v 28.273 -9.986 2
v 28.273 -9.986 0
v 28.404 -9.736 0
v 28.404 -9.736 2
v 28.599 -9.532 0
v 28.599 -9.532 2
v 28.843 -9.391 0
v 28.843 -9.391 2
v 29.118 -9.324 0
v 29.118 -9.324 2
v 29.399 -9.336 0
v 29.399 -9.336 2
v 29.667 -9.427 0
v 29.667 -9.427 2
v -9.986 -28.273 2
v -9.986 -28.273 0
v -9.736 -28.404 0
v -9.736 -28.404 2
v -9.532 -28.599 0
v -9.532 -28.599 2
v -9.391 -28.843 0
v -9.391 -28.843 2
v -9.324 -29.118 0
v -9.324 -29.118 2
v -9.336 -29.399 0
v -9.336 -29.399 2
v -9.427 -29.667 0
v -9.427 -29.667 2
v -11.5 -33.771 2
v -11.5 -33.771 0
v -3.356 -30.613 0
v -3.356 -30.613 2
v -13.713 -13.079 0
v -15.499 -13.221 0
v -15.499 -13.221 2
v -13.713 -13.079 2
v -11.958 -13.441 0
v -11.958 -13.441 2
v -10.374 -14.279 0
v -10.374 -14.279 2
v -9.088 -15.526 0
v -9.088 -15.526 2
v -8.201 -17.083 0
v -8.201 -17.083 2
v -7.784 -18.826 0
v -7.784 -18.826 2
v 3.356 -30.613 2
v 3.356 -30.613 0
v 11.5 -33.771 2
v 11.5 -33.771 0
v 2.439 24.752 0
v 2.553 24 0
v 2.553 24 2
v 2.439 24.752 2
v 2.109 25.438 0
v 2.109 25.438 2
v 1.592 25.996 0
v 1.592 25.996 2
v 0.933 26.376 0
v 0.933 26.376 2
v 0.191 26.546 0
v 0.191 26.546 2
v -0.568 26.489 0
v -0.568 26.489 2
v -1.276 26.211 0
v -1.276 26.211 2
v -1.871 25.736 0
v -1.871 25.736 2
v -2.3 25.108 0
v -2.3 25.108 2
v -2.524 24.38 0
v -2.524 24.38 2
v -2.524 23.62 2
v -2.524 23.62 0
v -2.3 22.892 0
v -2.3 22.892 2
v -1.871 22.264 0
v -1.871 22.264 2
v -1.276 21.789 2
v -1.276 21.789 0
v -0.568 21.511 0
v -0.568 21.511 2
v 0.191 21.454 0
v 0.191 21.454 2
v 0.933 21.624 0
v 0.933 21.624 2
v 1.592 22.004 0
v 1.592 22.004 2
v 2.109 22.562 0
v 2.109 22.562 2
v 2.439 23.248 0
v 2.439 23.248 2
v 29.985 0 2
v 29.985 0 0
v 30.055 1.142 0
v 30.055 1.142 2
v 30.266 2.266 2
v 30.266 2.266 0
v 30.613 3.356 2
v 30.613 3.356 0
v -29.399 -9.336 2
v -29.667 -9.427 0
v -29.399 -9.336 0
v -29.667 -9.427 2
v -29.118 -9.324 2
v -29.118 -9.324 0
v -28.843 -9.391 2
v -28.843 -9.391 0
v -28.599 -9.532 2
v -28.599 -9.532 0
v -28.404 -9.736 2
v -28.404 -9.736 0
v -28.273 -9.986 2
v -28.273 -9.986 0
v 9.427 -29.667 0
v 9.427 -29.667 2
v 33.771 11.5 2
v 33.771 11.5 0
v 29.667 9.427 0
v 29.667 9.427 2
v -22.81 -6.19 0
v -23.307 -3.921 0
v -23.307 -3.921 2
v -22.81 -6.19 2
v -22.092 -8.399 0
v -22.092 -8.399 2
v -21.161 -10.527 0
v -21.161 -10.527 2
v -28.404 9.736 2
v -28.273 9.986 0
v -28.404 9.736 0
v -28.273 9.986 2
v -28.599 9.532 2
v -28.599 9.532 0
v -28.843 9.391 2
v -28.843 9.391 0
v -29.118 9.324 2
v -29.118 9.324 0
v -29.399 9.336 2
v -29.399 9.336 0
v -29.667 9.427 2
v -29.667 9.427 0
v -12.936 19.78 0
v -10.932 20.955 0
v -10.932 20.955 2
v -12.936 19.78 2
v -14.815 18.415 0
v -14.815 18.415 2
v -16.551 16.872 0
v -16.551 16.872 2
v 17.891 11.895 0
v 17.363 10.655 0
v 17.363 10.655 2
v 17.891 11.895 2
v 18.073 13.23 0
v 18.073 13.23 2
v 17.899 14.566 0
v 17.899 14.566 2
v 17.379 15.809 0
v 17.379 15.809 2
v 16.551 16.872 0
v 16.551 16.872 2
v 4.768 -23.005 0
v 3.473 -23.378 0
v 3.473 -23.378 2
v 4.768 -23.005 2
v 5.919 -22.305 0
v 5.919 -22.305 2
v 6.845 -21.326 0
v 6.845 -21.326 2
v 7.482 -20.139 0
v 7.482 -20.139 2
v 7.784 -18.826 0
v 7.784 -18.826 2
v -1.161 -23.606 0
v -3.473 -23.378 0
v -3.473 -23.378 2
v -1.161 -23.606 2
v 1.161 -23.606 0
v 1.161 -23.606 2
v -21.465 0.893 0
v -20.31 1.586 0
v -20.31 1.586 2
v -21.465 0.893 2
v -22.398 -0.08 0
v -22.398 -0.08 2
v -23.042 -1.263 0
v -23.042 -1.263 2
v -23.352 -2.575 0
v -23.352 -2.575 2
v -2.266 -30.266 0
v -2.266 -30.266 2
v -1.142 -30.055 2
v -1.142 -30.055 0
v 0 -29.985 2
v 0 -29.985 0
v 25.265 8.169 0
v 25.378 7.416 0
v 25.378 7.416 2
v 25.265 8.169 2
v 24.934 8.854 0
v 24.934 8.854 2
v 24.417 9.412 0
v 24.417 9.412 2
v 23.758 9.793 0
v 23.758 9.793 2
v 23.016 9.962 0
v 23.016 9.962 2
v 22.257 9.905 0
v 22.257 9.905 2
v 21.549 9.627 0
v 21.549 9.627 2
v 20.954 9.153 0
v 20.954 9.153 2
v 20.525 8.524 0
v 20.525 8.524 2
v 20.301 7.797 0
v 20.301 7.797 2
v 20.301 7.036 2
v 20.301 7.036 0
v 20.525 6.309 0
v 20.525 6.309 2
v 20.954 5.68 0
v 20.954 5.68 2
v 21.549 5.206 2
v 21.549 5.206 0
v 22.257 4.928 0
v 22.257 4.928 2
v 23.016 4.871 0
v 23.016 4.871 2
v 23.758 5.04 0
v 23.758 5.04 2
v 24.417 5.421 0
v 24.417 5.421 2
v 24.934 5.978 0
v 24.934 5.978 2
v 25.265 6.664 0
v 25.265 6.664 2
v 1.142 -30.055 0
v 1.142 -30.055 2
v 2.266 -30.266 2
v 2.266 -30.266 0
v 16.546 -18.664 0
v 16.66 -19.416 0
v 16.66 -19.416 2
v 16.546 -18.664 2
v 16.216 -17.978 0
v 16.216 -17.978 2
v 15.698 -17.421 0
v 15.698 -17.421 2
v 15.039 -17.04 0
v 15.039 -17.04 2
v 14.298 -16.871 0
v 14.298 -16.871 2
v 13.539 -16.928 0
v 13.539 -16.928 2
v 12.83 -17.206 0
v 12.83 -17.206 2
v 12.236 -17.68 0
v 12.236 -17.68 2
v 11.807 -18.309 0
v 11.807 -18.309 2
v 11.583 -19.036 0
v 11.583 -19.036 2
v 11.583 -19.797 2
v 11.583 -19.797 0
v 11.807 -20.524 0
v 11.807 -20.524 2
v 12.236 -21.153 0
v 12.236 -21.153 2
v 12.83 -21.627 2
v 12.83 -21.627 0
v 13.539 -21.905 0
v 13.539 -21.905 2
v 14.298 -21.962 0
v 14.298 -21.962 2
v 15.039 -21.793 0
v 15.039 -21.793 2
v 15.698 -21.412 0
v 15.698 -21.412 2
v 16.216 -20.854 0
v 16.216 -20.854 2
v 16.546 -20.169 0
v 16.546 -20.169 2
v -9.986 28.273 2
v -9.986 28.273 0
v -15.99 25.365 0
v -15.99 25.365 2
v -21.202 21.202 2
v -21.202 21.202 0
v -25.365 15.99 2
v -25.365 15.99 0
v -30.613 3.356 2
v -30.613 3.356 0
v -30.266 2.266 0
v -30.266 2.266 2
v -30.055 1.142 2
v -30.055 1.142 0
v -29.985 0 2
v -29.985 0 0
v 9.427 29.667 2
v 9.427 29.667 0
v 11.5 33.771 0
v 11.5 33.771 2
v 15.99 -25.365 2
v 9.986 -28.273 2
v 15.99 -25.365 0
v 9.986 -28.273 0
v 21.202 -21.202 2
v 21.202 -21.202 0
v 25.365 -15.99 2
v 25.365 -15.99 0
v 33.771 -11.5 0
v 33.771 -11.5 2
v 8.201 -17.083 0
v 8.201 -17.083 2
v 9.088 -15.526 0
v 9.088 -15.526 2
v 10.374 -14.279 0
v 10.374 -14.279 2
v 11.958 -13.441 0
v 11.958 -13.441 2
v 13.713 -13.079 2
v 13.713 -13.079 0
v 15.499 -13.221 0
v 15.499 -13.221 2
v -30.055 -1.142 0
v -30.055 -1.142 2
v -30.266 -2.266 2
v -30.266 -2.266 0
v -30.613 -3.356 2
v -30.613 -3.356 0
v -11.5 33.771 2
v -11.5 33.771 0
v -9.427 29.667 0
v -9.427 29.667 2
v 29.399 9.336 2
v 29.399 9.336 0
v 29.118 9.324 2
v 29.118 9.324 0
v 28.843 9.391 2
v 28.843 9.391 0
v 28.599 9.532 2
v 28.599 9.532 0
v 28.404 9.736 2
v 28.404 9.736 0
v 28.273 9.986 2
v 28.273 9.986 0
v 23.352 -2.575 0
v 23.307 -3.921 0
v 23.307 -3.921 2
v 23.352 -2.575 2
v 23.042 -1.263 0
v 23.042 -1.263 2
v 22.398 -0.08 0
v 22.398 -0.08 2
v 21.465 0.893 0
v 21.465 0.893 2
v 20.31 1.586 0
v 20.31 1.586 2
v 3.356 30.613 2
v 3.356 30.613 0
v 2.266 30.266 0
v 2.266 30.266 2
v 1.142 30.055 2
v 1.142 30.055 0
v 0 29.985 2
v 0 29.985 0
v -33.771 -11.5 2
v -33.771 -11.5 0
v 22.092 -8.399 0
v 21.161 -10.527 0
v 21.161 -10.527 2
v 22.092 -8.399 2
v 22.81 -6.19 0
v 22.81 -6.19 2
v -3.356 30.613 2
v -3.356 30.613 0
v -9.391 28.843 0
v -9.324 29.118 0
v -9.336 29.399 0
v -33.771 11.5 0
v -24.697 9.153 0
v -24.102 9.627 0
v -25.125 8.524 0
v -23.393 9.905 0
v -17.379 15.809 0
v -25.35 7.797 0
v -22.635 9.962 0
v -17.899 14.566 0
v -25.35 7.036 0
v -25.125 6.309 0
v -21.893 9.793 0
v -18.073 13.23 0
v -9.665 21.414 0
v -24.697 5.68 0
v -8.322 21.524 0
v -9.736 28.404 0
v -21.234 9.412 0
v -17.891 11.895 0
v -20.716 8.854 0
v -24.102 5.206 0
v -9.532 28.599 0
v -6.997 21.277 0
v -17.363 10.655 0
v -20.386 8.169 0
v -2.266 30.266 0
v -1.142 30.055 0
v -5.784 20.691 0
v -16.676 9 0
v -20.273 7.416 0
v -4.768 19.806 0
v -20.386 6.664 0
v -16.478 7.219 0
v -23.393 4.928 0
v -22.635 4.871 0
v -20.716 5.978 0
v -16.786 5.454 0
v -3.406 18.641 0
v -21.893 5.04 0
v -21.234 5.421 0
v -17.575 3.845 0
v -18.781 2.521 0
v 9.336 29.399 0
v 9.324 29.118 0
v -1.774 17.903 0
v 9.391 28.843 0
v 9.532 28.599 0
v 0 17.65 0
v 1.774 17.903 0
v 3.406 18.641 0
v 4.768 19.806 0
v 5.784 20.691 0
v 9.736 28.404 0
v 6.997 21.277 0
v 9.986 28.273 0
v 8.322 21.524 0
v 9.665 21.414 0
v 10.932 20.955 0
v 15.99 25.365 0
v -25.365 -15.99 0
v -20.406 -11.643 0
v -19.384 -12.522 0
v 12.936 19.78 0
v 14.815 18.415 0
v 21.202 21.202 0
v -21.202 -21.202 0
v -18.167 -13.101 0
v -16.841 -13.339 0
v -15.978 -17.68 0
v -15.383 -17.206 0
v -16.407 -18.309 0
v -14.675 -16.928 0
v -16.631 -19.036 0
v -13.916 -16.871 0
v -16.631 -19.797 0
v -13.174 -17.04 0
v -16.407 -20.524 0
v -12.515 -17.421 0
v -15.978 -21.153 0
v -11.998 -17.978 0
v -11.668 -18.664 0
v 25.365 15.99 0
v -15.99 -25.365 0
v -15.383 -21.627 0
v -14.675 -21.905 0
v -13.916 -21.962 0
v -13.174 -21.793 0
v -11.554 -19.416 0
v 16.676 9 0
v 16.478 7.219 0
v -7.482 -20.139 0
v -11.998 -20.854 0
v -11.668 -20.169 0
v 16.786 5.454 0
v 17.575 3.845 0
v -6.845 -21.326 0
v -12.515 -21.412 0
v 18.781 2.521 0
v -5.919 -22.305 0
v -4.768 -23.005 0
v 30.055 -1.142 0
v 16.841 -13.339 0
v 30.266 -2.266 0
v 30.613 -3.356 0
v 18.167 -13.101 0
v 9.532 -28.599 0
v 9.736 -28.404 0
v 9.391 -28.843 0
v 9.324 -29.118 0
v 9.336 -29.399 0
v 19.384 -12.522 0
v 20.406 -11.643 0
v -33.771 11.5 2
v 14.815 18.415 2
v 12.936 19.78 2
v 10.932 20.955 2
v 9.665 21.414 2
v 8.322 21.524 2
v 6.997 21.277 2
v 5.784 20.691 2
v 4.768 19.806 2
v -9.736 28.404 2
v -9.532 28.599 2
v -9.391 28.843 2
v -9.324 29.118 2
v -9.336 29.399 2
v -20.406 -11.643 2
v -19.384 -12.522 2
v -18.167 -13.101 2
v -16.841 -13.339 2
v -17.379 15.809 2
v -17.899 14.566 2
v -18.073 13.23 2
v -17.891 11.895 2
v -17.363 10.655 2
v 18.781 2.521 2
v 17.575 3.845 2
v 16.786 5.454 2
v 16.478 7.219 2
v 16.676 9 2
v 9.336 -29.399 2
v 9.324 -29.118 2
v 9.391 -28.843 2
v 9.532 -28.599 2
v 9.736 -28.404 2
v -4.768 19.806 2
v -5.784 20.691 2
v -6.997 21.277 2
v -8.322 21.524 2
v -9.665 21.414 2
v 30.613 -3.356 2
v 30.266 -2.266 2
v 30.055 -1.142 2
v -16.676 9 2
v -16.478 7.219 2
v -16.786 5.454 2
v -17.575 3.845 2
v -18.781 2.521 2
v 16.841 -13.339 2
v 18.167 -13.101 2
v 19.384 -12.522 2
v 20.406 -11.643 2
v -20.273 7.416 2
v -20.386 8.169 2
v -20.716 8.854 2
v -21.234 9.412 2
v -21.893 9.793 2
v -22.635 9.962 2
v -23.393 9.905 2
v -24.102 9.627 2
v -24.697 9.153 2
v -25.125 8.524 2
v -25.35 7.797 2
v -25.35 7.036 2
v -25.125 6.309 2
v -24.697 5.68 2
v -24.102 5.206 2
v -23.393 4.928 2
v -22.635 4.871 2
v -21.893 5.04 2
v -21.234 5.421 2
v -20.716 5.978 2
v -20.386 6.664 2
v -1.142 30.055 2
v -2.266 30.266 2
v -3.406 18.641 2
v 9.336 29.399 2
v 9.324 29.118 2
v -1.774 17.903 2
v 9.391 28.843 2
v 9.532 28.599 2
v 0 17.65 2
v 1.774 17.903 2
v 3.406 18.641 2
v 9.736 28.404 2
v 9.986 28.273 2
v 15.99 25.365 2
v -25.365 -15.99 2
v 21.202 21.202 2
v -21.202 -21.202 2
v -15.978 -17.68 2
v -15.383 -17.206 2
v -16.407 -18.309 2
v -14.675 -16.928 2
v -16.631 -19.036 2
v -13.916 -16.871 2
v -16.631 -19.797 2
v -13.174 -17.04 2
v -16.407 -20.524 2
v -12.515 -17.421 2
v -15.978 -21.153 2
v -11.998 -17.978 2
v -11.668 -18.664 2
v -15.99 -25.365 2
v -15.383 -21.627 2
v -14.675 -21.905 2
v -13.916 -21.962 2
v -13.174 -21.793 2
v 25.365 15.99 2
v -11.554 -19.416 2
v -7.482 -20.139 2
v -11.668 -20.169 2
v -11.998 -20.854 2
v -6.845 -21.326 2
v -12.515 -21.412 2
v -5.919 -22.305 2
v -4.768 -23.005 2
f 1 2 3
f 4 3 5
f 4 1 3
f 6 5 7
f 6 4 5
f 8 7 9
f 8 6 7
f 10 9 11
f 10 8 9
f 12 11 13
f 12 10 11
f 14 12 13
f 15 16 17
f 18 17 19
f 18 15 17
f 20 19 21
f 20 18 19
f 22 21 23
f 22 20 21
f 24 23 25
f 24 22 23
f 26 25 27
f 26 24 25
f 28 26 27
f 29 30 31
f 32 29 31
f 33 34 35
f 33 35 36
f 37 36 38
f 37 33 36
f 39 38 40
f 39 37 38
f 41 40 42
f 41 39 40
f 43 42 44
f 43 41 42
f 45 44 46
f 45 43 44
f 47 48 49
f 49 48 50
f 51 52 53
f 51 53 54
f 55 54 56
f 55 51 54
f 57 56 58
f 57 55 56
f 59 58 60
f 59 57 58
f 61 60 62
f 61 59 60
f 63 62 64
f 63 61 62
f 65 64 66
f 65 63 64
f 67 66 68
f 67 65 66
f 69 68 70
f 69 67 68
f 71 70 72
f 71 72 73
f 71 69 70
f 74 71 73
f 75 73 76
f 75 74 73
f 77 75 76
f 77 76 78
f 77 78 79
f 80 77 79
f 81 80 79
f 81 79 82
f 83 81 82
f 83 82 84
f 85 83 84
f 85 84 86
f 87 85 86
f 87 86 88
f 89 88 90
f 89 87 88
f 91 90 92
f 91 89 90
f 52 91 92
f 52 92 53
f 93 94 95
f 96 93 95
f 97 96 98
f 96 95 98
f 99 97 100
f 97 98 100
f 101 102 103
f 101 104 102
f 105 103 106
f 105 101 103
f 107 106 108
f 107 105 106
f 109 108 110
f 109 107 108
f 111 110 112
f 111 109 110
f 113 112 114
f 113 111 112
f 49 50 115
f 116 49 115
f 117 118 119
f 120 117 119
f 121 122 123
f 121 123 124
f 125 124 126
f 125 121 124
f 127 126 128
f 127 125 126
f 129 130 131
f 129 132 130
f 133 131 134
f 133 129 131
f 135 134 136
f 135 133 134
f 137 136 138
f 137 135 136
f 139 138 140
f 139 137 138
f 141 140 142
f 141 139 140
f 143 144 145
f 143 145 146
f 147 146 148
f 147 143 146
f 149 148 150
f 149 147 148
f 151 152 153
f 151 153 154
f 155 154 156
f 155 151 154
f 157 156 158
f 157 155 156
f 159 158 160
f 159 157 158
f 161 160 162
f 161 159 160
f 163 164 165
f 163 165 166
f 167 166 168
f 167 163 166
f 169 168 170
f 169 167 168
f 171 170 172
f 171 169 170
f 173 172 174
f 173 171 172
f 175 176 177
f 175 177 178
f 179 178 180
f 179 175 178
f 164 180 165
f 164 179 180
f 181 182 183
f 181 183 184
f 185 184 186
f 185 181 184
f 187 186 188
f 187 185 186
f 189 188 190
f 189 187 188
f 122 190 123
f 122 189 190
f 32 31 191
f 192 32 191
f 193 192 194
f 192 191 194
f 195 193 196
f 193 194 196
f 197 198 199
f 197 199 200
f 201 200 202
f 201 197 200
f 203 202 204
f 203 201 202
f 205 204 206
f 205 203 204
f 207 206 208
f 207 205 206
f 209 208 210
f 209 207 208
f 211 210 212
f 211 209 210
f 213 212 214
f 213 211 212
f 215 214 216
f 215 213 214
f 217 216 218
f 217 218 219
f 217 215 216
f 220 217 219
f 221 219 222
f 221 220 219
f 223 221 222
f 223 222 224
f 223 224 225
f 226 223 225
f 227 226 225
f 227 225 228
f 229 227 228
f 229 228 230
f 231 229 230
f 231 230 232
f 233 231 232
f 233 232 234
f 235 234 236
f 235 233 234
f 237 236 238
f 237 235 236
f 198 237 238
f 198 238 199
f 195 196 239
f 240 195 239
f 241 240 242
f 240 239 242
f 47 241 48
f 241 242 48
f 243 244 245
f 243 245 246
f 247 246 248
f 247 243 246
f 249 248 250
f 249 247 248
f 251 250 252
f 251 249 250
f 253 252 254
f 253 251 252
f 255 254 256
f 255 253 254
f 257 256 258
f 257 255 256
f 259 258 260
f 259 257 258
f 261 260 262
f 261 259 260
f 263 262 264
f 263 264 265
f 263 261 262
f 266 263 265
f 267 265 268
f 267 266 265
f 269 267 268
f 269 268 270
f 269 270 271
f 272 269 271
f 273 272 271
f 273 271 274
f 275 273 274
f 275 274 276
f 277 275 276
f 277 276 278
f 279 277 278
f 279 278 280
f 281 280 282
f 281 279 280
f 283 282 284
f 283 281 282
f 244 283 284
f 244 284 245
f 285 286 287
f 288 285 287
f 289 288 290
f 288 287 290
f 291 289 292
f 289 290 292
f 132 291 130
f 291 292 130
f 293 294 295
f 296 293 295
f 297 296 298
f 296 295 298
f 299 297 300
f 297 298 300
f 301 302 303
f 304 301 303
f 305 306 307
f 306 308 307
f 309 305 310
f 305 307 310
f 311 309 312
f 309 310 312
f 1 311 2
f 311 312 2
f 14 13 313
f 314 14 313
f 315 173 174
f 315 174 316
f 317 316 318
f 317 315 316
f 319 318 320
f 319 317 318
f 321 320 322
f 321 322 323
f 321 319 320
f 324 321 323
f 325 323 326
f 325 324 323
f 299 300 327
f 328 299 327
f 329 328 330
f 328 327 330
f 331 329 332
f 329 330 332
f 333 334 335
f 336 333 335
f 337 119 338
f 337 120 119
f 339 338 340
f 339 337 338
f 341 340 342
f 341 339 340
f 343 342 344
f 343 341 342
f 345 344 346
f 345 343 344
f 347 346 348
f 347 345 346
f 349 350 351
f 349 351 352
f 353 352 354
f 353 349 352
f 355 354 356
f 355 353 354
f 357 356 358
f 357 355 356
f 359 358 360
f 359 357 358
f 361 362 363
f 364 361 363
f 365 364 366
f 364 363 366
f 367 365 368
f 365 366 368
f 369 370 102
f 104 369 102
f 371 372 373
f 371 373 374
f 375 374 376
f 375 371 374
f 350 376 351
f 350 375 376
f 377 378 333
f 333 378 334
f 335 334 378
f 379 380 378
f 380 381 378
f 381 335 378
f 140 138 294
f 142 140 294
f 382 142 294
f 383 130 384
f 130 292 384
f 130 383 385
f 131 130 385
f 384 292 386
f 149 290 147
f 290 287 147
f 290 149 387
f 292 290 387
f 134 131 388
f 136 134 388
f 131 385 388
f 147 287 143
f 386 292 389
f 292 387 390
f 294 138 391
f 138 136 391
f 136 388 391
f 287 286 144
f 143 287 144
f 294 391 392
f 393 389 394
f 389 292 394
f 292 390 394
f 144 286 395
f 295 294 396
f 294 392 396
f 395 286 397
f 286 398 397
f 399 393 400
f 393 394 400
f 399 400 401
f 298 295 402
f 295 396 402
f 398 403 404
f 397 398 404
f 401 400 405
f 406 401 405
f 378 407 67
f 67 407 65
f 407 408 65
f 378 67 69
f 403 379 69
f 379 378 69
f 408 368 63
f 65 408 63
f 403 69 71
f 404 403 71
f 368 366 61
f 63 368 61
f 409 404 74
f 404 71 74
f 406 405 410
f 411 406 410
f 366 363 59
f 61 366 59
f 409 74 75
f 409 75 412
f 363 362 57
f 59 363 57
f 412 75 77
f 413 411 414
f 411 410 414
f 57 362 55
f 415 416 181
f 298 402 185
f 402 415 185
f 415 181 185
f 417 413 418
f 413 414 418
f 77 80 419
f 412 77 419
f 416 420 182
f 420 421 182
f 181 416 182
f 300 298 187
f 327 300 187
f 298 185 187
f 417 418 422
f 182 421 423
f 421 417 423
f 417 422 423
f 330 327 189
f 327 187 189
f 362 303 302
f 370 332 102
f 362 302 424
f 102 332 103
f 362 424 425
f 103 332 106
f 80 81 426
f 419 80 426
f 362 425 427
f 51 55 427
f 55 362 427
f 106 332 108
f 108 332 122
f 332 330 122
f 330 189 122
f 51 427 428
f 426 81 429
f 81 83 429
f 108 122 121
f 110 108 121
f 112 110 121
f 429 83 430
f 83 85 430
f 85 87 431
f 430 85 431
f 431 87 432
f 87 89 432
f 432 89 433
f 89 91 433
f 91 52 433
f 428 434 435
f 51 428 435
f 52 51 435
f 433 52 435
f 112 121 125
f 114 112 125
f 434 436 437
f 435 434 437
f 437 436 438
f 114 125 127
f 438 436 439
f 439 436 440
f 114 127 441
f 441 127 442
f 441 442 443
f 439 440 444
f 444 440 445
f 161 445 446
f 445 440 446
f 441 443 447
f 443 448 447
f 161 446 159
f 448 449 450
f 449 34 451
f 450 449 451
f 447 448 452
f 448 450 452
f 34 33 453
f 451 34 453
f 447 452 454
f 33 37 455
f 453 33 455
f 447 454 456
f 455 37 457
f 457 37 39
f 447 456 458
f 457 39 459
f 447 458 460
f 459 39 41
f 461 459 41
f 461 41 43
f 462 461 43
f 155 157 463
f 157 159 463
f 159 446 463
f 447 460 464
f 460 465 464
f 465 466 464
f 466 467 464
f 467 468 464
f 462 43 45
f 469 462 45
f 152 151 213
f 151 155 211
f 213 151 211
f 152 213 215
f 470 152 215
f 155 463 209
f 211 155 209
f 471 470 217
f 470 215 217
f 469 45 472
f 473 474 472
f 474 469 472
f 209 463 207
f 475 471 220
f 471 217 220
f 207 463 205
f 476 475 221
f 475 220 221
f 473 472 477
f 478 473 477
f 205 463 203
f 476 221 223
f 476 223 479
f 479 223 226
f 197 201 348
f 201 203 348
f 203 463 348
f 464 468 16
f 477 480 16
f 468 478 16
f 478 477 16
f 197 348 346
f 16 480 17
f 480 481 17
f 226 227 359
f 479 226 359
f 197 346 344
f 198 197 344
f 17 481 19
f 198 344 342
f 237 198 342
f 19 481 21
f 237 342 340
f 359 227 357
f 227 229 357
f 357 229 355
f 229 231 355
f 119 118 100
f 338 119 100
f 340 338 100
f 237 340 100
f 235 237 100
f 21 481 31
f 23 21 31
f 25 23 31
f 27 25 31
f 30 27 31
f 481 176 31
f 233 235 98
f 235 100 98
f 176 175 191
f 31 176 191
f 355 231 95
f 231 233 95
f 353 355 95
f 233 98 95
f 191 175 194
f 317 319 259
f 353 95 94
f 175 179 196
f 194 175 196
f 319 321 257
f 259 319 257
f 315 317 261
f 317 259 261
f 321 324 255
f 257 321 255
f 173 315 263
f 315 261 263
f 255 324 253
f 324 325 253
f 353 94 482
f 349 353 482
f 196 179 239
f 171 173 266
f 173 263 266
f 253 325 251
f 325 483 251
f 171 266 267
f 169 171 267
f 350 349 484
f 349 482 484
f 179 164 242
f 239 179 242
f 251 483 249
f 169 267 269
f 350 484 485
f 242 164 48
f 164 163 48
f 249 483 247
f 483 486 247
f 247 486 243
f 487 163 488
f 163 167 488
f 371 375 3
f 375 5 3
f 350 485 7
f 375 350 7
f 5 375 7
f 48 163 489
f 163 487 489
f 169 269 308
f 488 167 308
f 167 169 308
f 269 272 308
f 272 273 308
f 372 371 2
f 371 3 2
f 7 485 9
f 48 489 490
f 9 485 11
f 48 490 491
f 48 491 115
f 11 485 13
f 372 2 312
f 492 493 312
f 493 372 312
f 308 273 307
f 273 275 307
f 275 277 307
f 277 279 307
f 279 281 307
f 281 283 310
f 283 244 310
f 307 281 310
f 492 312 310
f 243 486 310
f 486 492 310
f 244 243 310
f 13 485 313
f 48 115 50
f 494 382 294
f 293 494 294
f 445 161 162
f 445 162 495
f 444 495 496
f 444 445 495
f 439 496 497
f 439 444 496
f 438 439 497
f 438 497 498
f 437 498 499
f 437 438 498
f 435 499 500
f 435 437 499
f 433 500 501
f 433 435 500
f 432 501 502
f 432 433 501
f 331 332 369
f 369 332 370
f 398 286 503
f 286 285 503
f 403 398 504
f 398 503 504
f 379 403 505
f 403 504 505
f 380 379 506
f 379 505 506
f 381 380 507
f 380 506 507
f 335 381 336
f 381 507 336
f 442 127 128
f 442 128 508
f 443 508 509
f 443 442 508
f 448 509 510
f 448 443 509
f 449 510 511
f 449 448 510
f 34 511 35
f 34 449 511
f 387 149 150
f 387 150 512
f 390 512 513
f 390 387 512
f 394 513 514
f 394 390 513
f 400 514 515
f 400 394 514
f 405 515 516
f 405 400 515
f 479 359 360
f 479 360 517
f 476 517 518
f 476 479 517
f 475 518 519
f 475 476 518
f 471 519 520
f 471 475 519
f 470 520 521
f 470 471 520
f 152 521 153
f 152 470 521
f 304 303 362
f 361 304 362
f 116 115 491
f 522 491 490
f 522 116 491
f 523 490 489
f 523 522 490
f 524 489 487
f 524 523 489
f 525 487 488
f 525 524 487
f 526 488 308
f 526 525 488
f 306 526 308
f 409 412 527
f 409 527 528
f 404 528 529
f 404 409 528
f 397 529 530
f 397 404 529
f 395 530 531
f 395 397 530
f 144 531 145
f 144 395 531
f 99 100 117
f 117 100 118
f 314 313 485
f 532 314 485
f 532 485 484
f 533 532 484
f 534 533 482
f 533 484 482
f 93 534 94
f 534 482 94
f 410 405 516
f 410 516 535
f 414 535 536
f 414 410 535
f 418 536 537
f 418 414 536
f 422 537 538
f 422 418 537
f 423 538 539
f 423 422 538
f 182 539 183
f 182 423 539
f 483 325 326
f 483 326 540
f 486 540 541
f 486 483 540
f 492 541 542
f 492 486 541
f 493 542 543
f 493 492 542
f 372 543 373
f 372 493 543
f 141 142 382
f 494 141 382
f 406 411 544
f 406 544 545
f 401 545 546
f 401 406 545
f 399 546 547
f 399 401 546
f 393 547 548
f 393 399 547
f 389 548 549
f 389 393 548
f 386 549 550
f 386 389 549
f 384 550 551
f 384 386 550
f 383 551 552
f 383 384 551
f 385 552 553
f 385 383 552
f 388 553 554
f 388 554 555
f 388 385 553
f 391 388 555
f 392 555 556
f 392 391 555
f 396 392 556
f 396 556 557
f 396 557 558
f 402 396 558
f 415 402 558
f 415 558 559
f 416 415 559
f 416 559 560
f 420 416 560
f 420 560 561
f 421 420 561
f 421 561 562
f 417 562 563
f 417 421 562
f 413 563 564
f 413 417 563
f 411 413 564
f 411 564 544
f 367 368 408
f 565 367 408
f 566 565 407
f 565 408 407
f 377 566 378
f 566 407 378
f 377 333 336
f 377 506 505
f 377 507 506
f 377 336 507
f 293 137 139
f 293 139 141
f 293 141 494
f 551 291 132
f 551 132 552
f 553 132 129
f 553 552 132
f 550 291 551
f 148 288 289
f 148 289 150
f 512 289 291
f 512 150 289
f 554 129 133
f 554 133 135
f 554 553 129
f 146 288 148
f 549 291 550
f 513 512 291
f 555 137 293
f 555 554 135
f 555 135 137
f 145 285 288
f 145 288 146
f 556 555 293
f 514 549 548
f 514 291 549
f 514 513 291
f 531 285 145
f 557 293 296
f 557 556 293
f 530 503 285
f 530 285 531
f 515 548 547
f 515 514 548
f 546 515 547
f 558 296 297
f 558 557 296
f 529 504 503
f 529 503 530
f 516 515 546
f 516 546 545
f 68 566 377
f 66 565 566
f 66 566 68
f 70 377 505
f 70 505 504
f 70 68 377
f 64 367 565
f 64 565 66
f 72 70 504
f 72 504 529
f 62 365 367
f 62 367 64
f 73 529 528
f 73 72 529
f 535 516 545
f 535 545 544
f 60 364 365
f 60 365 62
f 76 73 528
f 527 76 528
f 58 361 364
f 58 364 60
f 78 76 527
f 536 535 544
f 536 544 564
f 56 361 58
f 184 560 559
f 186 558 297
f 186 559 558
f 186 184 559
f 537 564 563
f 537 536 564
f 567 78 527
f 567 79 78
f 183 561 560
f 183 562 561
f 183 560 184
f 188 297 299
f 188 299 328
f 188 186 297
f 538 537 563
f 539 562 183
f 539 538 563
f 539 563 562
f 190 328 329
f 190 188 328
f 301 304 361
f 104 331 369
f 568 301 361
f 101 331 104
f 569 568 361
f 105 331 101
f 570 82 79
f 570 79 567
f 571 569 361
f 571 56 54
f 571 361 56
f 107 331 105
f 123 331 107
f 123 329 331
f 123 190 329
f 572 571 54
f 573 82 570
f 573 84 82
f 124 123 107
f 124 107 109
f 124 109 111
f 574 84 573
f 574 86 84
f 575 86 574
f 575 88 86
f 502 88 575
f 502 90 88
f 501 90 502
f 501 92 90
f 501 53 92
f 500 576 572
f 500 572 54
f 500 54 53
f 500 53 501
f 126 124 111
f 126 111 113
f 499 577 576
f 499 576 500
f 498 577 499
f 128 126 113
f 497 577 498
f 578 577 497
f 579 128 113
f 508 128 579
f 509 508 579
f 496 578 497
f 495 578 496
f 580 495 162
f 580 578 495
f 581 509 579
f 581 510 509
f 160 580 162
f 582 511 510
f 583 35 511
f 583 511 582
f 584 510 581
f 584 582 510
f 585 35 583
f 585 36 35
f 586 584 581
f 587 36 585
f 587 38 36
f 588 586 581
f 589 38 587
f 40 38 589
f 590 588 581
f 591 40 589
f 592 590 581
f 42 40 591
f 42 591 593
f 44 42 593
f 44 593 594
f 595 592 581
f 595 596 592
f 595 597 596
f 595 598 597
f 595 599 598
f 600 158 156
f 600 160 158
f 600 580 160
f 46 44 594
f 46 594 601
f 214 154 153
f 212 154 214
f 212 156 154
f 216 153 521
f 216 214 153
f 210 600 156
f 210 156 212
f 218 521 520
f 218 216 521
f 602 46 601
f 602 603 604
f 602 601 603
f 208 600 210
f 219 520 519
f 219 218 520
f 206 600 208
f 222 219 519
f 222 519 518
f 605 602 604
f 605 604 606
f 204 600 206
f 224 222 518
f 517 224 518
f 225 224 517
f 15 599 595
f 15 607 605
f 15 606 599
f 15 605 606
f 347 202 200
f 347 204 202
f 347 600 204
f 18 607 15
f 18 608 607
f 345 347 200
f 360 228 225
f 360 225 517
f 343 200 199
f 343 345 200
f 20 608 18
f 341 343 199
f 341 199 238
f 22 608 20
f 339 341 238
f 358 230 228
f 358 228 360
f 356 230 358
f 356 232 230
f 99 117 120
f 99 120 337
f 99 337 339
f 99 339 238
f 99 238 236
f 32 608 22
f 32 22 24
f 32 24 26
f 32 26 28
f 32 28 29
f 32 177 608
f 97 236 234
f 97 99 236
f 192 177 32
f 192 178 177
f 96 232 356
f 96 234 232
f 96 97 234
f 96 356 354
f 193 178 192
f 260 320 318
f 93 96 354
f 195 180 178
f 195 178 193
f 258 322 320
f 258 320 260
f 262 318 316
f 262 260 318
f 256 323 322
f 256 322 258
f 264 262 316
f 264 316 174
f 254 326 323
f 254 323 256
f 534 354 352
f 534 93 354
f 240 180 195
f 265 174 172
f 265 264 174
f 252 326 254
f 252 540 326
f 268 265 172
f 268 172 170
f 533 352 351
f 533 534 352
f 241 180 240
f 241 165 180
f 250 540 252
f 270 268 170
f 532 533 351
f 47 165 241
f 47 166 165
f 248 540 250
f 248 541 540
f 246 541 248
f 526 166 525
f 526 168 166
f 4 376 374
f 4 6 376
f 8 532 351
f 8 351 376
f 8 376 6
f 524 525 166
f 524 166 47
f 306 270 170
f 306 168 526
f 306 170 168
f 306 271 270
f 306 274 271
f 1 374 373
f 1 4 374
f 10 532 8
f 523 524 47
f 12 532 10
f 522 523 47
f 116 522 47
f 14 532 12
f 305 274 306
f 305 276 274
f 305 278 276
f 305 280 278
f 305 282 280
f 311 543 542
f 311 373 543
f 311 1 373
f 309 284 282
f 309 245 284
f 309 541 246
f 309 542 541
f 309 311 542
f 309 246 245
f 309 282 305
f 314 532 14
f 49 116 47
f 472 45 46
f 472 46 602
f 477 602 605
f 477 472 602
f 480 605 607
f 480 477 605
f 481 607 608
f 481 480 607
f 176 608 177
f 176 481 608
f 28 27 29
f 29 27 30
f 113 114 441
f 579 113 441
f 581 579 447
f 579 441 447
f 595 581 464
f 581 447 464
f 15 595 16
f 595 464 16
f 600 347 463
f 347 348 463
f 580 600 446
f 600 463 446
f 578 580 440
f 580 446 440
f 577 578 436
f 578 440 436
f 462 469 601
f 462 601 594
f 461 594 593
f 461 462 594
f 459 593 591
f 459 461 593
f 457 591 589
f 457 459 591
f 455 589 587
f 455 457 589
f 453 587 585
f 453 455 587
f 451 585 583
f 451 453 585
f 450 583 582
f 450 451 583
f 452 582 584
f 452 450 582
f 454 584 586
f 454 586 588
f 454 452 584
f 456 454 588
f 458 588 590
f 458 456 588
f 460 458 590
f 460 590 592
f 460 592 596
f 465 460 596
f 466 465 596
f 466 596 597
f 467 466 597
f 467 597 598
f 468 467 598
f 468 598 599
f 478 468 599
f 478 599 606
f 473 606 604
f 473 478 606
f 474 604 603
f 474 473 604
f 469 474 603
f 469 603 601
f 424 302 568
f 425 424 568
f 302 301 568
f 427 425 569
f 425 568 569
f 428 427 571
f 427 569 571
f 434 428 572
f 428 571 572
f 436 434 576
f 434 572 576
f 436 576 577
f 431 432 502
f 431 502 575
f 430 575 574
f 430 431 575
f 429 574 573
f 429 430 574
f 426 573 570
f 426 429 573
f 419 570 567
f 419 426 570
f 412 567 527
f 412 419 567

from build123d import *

# Parameters (mm, degrees)
SKETCH1_R                = 29.9847
SKETCH1_R_2              = 2.5527
BOSS_EXTRUDE1_DEPTH      = 2
BOSS_EXTRUDE2_DEPTH      = 2
FILLET1_R                = 1
CIRPATTERN1_COUNT        = 4
FILLET1_OF_CIRPATTERN1_R = 1


with BuildPart() as part:
    # Sketch1 → Boss-Extrude1 (new body)
    with BuildSketch(Plane.XY):
        Circle(SKETCH1_R)
        with Locations((-22.825356391, 7.416407865)):
            Circle(SKETCH1_R_2, mode=Mode.SUBTRACT)
        with Locations((-14.106846055, -19.416407865)):
            Circle(SKETCH1_R_2, mode=Mode.SUBTRACT)
        with Locations((14.106846055, -19.416407865)):
            Circle(SKETCH1_R_2, mode=Mode.SUBTRACT)
        with Locations((22.825356391, 7.416407865)):
            Circle(SKETCH1_R_2, mode=Mode.SUBTRACT)
        with Locations((0, 24)):
            Circle(SKETCH1_R_2, mode=Mode.SUBTRACT)
        with BuildLine():
            ThreePointArc((-10.931752655, 20.954613525), (-13.892128102, 19.120873957), (-16.550924391, 16.872046287))
            ThreePointArc((-16.550924391, 16.872046287), (-18.030688134, 13.903717203), (-17.363213066, 10.65484735))
            ThreePointArc((-17.363213066, 10.65484735), (-16.786147513, 5.454149951), (-20.309896586, 1.585887994))
            ThreePointArc((-20.309896586, 1.585887994), (-22.759533045, -0.650170928), (-23.307119088, -3.921382907))
            ThreePointArc((-23.307119088, -3.921382907), (-22.477935446, -7.303523957), (-21.160786474, -10.52711546))
            ThreePointArc((-21.160786474, -10.52711546), (-18.7950099, -12.851718542), (-15.498889917, -13.220868027))
            ThreePointArc((-15.498889917, -13.220868027), (-10.374409703, -14.279149951), (-7.78437231, -18.825793152))
            ThreePointArc((-7.78437231, -18.825793152), (-6.414733197, -21.846516076), (-3.472839121, -23.378161445))
            ThreePointArc((-3.472839121, -23.378161445), (0, -23.6347), (3.472839121, -23.378161445))
            ThreePointArc((3.472839121, -23.378161445), (6.414733197, -21.846516076), (7.78437231, -18.825793152))
            ThreePointArc((7.78437231, -18.825793152), (10.374409703, -14.279149951), (15.498889917, -13.220868027))
            ThreePointArc((15.498889917, -13.220868027), (18.7950099, -12.851718542), (21.160786474, -10.52711546))
            ThreePointArc((21.160786474, -10.52711546), (22.477935446, -7.303523957), (23.307119088, -3.921382907))
            ThreePointArc((23.307119088, -3.921382907), (22.759533045, -0.650170928), (20.309896586, 1.585887994))
            ThreePointArc((20.309896586, 1.585887994), (16.786147513, 5.454149951), (17.363213066, 10.65484735))
            ThreePointArc((17.363213066, 10.65484735), (18.030688134, 13.903717203), (16.550924391, 16.872046287))
            ThreePointArc((16.550924391, 16.872046287), (13.892128102, 19.120873957), (10.931752655, 20.954613525))
            ThreePointArc((10.931752655, 20.954613525), (7.651431793, 21.444688344), (4.767834088, 19.805925834))
            ThreePointArc((4.767834088, 19.805925834), (0, 17.65), (-4.767834088, 19.805925834))
            ThreePointArc((-4.767834088, 19.805925834), (-7.651431793, 21.444688344), (-10.931752655, 20.954613525))
        make_face(mode=Mode.SUBTRACT)
    extrude(amount=BOSS_EXTRUDE1_DEPTH)

    # Sketch1<4> → Boss-Extrude2 (add)
    with BuildSketch(Plane.XY):
        with BuildLine():
            Line((-3.355662517, 30.612532095), (-11.5, 33.770632582))
            Line((-11.5, 33.770632582), (-8.903800235, 28.632229663))
            ThreePointArc((-8.903800235, 28.632229663), (-4.502966651, 29.644654247), (0, 29.9847))
            ThreePointArc((0, 29.9847), (-1.706944937, 30.143008076), (-3.355662517, 30.612532095))
        make_face()
        with BuildLine():
            ThreePointArc((3.355662517, 30.612532095), (1.706944937, 30.143008076), (0, 29.9847))
            ThreePointArc((0, 29.9847), (4.502966651, 29.644654247), (8.903800235, 28.632229663))
            Line((8.903800235, 28.632229663), (11.5, 33.770632582))
            Line((11.5, 33.770632582), (3.355662517, 30.612532095))
        make_face()
    boss_extrude2 = extrude(amount=BOSS_EXTRUDE2_DEPTH)

    # Fillet1
    fillet1_edges = [part.edges().sort_by_distance(p)[0] for p in [
        (-8.903800235, 28.632229663, 1),
        (8.903800235, 28.632229663, 1),
    ]]
    fillet(fillet1_edges, radius=FILLET1_R)

    # CirPattern1: Boss-Extrude2 ×4 about axis
    cirpattern1_axis = Axis((0, 0, 0), (0, 0, 1))
    for i in range(1, CIRPATTERN1_COUNT):
        add(boss_extrude2.rotate(cirpattern1_axis, i * 360 / CIRPATTERN1_COUNT))

    # Fillet1 of CirPattern1
    fillet1_of_cirpattern1_edges = [part.edges().sort_by_distance(p)[0] for p in [
        (-28.632229663, -8.903800235, 1),
        (-28.632229663, 8.903800235, 1),
        (8.903800235, -28.632229663, 1),
        (-8.903800235, -28.632229663, 1),
        (28.632229663, 8.903800235, 1),
        (28.632229663, -8.903800235, 1),
    ]]
    fillet(fillet1_of_cirpattern1_edges, radius=FILLET1_OF_CIRPATTERN1_R)


solid = part.part
